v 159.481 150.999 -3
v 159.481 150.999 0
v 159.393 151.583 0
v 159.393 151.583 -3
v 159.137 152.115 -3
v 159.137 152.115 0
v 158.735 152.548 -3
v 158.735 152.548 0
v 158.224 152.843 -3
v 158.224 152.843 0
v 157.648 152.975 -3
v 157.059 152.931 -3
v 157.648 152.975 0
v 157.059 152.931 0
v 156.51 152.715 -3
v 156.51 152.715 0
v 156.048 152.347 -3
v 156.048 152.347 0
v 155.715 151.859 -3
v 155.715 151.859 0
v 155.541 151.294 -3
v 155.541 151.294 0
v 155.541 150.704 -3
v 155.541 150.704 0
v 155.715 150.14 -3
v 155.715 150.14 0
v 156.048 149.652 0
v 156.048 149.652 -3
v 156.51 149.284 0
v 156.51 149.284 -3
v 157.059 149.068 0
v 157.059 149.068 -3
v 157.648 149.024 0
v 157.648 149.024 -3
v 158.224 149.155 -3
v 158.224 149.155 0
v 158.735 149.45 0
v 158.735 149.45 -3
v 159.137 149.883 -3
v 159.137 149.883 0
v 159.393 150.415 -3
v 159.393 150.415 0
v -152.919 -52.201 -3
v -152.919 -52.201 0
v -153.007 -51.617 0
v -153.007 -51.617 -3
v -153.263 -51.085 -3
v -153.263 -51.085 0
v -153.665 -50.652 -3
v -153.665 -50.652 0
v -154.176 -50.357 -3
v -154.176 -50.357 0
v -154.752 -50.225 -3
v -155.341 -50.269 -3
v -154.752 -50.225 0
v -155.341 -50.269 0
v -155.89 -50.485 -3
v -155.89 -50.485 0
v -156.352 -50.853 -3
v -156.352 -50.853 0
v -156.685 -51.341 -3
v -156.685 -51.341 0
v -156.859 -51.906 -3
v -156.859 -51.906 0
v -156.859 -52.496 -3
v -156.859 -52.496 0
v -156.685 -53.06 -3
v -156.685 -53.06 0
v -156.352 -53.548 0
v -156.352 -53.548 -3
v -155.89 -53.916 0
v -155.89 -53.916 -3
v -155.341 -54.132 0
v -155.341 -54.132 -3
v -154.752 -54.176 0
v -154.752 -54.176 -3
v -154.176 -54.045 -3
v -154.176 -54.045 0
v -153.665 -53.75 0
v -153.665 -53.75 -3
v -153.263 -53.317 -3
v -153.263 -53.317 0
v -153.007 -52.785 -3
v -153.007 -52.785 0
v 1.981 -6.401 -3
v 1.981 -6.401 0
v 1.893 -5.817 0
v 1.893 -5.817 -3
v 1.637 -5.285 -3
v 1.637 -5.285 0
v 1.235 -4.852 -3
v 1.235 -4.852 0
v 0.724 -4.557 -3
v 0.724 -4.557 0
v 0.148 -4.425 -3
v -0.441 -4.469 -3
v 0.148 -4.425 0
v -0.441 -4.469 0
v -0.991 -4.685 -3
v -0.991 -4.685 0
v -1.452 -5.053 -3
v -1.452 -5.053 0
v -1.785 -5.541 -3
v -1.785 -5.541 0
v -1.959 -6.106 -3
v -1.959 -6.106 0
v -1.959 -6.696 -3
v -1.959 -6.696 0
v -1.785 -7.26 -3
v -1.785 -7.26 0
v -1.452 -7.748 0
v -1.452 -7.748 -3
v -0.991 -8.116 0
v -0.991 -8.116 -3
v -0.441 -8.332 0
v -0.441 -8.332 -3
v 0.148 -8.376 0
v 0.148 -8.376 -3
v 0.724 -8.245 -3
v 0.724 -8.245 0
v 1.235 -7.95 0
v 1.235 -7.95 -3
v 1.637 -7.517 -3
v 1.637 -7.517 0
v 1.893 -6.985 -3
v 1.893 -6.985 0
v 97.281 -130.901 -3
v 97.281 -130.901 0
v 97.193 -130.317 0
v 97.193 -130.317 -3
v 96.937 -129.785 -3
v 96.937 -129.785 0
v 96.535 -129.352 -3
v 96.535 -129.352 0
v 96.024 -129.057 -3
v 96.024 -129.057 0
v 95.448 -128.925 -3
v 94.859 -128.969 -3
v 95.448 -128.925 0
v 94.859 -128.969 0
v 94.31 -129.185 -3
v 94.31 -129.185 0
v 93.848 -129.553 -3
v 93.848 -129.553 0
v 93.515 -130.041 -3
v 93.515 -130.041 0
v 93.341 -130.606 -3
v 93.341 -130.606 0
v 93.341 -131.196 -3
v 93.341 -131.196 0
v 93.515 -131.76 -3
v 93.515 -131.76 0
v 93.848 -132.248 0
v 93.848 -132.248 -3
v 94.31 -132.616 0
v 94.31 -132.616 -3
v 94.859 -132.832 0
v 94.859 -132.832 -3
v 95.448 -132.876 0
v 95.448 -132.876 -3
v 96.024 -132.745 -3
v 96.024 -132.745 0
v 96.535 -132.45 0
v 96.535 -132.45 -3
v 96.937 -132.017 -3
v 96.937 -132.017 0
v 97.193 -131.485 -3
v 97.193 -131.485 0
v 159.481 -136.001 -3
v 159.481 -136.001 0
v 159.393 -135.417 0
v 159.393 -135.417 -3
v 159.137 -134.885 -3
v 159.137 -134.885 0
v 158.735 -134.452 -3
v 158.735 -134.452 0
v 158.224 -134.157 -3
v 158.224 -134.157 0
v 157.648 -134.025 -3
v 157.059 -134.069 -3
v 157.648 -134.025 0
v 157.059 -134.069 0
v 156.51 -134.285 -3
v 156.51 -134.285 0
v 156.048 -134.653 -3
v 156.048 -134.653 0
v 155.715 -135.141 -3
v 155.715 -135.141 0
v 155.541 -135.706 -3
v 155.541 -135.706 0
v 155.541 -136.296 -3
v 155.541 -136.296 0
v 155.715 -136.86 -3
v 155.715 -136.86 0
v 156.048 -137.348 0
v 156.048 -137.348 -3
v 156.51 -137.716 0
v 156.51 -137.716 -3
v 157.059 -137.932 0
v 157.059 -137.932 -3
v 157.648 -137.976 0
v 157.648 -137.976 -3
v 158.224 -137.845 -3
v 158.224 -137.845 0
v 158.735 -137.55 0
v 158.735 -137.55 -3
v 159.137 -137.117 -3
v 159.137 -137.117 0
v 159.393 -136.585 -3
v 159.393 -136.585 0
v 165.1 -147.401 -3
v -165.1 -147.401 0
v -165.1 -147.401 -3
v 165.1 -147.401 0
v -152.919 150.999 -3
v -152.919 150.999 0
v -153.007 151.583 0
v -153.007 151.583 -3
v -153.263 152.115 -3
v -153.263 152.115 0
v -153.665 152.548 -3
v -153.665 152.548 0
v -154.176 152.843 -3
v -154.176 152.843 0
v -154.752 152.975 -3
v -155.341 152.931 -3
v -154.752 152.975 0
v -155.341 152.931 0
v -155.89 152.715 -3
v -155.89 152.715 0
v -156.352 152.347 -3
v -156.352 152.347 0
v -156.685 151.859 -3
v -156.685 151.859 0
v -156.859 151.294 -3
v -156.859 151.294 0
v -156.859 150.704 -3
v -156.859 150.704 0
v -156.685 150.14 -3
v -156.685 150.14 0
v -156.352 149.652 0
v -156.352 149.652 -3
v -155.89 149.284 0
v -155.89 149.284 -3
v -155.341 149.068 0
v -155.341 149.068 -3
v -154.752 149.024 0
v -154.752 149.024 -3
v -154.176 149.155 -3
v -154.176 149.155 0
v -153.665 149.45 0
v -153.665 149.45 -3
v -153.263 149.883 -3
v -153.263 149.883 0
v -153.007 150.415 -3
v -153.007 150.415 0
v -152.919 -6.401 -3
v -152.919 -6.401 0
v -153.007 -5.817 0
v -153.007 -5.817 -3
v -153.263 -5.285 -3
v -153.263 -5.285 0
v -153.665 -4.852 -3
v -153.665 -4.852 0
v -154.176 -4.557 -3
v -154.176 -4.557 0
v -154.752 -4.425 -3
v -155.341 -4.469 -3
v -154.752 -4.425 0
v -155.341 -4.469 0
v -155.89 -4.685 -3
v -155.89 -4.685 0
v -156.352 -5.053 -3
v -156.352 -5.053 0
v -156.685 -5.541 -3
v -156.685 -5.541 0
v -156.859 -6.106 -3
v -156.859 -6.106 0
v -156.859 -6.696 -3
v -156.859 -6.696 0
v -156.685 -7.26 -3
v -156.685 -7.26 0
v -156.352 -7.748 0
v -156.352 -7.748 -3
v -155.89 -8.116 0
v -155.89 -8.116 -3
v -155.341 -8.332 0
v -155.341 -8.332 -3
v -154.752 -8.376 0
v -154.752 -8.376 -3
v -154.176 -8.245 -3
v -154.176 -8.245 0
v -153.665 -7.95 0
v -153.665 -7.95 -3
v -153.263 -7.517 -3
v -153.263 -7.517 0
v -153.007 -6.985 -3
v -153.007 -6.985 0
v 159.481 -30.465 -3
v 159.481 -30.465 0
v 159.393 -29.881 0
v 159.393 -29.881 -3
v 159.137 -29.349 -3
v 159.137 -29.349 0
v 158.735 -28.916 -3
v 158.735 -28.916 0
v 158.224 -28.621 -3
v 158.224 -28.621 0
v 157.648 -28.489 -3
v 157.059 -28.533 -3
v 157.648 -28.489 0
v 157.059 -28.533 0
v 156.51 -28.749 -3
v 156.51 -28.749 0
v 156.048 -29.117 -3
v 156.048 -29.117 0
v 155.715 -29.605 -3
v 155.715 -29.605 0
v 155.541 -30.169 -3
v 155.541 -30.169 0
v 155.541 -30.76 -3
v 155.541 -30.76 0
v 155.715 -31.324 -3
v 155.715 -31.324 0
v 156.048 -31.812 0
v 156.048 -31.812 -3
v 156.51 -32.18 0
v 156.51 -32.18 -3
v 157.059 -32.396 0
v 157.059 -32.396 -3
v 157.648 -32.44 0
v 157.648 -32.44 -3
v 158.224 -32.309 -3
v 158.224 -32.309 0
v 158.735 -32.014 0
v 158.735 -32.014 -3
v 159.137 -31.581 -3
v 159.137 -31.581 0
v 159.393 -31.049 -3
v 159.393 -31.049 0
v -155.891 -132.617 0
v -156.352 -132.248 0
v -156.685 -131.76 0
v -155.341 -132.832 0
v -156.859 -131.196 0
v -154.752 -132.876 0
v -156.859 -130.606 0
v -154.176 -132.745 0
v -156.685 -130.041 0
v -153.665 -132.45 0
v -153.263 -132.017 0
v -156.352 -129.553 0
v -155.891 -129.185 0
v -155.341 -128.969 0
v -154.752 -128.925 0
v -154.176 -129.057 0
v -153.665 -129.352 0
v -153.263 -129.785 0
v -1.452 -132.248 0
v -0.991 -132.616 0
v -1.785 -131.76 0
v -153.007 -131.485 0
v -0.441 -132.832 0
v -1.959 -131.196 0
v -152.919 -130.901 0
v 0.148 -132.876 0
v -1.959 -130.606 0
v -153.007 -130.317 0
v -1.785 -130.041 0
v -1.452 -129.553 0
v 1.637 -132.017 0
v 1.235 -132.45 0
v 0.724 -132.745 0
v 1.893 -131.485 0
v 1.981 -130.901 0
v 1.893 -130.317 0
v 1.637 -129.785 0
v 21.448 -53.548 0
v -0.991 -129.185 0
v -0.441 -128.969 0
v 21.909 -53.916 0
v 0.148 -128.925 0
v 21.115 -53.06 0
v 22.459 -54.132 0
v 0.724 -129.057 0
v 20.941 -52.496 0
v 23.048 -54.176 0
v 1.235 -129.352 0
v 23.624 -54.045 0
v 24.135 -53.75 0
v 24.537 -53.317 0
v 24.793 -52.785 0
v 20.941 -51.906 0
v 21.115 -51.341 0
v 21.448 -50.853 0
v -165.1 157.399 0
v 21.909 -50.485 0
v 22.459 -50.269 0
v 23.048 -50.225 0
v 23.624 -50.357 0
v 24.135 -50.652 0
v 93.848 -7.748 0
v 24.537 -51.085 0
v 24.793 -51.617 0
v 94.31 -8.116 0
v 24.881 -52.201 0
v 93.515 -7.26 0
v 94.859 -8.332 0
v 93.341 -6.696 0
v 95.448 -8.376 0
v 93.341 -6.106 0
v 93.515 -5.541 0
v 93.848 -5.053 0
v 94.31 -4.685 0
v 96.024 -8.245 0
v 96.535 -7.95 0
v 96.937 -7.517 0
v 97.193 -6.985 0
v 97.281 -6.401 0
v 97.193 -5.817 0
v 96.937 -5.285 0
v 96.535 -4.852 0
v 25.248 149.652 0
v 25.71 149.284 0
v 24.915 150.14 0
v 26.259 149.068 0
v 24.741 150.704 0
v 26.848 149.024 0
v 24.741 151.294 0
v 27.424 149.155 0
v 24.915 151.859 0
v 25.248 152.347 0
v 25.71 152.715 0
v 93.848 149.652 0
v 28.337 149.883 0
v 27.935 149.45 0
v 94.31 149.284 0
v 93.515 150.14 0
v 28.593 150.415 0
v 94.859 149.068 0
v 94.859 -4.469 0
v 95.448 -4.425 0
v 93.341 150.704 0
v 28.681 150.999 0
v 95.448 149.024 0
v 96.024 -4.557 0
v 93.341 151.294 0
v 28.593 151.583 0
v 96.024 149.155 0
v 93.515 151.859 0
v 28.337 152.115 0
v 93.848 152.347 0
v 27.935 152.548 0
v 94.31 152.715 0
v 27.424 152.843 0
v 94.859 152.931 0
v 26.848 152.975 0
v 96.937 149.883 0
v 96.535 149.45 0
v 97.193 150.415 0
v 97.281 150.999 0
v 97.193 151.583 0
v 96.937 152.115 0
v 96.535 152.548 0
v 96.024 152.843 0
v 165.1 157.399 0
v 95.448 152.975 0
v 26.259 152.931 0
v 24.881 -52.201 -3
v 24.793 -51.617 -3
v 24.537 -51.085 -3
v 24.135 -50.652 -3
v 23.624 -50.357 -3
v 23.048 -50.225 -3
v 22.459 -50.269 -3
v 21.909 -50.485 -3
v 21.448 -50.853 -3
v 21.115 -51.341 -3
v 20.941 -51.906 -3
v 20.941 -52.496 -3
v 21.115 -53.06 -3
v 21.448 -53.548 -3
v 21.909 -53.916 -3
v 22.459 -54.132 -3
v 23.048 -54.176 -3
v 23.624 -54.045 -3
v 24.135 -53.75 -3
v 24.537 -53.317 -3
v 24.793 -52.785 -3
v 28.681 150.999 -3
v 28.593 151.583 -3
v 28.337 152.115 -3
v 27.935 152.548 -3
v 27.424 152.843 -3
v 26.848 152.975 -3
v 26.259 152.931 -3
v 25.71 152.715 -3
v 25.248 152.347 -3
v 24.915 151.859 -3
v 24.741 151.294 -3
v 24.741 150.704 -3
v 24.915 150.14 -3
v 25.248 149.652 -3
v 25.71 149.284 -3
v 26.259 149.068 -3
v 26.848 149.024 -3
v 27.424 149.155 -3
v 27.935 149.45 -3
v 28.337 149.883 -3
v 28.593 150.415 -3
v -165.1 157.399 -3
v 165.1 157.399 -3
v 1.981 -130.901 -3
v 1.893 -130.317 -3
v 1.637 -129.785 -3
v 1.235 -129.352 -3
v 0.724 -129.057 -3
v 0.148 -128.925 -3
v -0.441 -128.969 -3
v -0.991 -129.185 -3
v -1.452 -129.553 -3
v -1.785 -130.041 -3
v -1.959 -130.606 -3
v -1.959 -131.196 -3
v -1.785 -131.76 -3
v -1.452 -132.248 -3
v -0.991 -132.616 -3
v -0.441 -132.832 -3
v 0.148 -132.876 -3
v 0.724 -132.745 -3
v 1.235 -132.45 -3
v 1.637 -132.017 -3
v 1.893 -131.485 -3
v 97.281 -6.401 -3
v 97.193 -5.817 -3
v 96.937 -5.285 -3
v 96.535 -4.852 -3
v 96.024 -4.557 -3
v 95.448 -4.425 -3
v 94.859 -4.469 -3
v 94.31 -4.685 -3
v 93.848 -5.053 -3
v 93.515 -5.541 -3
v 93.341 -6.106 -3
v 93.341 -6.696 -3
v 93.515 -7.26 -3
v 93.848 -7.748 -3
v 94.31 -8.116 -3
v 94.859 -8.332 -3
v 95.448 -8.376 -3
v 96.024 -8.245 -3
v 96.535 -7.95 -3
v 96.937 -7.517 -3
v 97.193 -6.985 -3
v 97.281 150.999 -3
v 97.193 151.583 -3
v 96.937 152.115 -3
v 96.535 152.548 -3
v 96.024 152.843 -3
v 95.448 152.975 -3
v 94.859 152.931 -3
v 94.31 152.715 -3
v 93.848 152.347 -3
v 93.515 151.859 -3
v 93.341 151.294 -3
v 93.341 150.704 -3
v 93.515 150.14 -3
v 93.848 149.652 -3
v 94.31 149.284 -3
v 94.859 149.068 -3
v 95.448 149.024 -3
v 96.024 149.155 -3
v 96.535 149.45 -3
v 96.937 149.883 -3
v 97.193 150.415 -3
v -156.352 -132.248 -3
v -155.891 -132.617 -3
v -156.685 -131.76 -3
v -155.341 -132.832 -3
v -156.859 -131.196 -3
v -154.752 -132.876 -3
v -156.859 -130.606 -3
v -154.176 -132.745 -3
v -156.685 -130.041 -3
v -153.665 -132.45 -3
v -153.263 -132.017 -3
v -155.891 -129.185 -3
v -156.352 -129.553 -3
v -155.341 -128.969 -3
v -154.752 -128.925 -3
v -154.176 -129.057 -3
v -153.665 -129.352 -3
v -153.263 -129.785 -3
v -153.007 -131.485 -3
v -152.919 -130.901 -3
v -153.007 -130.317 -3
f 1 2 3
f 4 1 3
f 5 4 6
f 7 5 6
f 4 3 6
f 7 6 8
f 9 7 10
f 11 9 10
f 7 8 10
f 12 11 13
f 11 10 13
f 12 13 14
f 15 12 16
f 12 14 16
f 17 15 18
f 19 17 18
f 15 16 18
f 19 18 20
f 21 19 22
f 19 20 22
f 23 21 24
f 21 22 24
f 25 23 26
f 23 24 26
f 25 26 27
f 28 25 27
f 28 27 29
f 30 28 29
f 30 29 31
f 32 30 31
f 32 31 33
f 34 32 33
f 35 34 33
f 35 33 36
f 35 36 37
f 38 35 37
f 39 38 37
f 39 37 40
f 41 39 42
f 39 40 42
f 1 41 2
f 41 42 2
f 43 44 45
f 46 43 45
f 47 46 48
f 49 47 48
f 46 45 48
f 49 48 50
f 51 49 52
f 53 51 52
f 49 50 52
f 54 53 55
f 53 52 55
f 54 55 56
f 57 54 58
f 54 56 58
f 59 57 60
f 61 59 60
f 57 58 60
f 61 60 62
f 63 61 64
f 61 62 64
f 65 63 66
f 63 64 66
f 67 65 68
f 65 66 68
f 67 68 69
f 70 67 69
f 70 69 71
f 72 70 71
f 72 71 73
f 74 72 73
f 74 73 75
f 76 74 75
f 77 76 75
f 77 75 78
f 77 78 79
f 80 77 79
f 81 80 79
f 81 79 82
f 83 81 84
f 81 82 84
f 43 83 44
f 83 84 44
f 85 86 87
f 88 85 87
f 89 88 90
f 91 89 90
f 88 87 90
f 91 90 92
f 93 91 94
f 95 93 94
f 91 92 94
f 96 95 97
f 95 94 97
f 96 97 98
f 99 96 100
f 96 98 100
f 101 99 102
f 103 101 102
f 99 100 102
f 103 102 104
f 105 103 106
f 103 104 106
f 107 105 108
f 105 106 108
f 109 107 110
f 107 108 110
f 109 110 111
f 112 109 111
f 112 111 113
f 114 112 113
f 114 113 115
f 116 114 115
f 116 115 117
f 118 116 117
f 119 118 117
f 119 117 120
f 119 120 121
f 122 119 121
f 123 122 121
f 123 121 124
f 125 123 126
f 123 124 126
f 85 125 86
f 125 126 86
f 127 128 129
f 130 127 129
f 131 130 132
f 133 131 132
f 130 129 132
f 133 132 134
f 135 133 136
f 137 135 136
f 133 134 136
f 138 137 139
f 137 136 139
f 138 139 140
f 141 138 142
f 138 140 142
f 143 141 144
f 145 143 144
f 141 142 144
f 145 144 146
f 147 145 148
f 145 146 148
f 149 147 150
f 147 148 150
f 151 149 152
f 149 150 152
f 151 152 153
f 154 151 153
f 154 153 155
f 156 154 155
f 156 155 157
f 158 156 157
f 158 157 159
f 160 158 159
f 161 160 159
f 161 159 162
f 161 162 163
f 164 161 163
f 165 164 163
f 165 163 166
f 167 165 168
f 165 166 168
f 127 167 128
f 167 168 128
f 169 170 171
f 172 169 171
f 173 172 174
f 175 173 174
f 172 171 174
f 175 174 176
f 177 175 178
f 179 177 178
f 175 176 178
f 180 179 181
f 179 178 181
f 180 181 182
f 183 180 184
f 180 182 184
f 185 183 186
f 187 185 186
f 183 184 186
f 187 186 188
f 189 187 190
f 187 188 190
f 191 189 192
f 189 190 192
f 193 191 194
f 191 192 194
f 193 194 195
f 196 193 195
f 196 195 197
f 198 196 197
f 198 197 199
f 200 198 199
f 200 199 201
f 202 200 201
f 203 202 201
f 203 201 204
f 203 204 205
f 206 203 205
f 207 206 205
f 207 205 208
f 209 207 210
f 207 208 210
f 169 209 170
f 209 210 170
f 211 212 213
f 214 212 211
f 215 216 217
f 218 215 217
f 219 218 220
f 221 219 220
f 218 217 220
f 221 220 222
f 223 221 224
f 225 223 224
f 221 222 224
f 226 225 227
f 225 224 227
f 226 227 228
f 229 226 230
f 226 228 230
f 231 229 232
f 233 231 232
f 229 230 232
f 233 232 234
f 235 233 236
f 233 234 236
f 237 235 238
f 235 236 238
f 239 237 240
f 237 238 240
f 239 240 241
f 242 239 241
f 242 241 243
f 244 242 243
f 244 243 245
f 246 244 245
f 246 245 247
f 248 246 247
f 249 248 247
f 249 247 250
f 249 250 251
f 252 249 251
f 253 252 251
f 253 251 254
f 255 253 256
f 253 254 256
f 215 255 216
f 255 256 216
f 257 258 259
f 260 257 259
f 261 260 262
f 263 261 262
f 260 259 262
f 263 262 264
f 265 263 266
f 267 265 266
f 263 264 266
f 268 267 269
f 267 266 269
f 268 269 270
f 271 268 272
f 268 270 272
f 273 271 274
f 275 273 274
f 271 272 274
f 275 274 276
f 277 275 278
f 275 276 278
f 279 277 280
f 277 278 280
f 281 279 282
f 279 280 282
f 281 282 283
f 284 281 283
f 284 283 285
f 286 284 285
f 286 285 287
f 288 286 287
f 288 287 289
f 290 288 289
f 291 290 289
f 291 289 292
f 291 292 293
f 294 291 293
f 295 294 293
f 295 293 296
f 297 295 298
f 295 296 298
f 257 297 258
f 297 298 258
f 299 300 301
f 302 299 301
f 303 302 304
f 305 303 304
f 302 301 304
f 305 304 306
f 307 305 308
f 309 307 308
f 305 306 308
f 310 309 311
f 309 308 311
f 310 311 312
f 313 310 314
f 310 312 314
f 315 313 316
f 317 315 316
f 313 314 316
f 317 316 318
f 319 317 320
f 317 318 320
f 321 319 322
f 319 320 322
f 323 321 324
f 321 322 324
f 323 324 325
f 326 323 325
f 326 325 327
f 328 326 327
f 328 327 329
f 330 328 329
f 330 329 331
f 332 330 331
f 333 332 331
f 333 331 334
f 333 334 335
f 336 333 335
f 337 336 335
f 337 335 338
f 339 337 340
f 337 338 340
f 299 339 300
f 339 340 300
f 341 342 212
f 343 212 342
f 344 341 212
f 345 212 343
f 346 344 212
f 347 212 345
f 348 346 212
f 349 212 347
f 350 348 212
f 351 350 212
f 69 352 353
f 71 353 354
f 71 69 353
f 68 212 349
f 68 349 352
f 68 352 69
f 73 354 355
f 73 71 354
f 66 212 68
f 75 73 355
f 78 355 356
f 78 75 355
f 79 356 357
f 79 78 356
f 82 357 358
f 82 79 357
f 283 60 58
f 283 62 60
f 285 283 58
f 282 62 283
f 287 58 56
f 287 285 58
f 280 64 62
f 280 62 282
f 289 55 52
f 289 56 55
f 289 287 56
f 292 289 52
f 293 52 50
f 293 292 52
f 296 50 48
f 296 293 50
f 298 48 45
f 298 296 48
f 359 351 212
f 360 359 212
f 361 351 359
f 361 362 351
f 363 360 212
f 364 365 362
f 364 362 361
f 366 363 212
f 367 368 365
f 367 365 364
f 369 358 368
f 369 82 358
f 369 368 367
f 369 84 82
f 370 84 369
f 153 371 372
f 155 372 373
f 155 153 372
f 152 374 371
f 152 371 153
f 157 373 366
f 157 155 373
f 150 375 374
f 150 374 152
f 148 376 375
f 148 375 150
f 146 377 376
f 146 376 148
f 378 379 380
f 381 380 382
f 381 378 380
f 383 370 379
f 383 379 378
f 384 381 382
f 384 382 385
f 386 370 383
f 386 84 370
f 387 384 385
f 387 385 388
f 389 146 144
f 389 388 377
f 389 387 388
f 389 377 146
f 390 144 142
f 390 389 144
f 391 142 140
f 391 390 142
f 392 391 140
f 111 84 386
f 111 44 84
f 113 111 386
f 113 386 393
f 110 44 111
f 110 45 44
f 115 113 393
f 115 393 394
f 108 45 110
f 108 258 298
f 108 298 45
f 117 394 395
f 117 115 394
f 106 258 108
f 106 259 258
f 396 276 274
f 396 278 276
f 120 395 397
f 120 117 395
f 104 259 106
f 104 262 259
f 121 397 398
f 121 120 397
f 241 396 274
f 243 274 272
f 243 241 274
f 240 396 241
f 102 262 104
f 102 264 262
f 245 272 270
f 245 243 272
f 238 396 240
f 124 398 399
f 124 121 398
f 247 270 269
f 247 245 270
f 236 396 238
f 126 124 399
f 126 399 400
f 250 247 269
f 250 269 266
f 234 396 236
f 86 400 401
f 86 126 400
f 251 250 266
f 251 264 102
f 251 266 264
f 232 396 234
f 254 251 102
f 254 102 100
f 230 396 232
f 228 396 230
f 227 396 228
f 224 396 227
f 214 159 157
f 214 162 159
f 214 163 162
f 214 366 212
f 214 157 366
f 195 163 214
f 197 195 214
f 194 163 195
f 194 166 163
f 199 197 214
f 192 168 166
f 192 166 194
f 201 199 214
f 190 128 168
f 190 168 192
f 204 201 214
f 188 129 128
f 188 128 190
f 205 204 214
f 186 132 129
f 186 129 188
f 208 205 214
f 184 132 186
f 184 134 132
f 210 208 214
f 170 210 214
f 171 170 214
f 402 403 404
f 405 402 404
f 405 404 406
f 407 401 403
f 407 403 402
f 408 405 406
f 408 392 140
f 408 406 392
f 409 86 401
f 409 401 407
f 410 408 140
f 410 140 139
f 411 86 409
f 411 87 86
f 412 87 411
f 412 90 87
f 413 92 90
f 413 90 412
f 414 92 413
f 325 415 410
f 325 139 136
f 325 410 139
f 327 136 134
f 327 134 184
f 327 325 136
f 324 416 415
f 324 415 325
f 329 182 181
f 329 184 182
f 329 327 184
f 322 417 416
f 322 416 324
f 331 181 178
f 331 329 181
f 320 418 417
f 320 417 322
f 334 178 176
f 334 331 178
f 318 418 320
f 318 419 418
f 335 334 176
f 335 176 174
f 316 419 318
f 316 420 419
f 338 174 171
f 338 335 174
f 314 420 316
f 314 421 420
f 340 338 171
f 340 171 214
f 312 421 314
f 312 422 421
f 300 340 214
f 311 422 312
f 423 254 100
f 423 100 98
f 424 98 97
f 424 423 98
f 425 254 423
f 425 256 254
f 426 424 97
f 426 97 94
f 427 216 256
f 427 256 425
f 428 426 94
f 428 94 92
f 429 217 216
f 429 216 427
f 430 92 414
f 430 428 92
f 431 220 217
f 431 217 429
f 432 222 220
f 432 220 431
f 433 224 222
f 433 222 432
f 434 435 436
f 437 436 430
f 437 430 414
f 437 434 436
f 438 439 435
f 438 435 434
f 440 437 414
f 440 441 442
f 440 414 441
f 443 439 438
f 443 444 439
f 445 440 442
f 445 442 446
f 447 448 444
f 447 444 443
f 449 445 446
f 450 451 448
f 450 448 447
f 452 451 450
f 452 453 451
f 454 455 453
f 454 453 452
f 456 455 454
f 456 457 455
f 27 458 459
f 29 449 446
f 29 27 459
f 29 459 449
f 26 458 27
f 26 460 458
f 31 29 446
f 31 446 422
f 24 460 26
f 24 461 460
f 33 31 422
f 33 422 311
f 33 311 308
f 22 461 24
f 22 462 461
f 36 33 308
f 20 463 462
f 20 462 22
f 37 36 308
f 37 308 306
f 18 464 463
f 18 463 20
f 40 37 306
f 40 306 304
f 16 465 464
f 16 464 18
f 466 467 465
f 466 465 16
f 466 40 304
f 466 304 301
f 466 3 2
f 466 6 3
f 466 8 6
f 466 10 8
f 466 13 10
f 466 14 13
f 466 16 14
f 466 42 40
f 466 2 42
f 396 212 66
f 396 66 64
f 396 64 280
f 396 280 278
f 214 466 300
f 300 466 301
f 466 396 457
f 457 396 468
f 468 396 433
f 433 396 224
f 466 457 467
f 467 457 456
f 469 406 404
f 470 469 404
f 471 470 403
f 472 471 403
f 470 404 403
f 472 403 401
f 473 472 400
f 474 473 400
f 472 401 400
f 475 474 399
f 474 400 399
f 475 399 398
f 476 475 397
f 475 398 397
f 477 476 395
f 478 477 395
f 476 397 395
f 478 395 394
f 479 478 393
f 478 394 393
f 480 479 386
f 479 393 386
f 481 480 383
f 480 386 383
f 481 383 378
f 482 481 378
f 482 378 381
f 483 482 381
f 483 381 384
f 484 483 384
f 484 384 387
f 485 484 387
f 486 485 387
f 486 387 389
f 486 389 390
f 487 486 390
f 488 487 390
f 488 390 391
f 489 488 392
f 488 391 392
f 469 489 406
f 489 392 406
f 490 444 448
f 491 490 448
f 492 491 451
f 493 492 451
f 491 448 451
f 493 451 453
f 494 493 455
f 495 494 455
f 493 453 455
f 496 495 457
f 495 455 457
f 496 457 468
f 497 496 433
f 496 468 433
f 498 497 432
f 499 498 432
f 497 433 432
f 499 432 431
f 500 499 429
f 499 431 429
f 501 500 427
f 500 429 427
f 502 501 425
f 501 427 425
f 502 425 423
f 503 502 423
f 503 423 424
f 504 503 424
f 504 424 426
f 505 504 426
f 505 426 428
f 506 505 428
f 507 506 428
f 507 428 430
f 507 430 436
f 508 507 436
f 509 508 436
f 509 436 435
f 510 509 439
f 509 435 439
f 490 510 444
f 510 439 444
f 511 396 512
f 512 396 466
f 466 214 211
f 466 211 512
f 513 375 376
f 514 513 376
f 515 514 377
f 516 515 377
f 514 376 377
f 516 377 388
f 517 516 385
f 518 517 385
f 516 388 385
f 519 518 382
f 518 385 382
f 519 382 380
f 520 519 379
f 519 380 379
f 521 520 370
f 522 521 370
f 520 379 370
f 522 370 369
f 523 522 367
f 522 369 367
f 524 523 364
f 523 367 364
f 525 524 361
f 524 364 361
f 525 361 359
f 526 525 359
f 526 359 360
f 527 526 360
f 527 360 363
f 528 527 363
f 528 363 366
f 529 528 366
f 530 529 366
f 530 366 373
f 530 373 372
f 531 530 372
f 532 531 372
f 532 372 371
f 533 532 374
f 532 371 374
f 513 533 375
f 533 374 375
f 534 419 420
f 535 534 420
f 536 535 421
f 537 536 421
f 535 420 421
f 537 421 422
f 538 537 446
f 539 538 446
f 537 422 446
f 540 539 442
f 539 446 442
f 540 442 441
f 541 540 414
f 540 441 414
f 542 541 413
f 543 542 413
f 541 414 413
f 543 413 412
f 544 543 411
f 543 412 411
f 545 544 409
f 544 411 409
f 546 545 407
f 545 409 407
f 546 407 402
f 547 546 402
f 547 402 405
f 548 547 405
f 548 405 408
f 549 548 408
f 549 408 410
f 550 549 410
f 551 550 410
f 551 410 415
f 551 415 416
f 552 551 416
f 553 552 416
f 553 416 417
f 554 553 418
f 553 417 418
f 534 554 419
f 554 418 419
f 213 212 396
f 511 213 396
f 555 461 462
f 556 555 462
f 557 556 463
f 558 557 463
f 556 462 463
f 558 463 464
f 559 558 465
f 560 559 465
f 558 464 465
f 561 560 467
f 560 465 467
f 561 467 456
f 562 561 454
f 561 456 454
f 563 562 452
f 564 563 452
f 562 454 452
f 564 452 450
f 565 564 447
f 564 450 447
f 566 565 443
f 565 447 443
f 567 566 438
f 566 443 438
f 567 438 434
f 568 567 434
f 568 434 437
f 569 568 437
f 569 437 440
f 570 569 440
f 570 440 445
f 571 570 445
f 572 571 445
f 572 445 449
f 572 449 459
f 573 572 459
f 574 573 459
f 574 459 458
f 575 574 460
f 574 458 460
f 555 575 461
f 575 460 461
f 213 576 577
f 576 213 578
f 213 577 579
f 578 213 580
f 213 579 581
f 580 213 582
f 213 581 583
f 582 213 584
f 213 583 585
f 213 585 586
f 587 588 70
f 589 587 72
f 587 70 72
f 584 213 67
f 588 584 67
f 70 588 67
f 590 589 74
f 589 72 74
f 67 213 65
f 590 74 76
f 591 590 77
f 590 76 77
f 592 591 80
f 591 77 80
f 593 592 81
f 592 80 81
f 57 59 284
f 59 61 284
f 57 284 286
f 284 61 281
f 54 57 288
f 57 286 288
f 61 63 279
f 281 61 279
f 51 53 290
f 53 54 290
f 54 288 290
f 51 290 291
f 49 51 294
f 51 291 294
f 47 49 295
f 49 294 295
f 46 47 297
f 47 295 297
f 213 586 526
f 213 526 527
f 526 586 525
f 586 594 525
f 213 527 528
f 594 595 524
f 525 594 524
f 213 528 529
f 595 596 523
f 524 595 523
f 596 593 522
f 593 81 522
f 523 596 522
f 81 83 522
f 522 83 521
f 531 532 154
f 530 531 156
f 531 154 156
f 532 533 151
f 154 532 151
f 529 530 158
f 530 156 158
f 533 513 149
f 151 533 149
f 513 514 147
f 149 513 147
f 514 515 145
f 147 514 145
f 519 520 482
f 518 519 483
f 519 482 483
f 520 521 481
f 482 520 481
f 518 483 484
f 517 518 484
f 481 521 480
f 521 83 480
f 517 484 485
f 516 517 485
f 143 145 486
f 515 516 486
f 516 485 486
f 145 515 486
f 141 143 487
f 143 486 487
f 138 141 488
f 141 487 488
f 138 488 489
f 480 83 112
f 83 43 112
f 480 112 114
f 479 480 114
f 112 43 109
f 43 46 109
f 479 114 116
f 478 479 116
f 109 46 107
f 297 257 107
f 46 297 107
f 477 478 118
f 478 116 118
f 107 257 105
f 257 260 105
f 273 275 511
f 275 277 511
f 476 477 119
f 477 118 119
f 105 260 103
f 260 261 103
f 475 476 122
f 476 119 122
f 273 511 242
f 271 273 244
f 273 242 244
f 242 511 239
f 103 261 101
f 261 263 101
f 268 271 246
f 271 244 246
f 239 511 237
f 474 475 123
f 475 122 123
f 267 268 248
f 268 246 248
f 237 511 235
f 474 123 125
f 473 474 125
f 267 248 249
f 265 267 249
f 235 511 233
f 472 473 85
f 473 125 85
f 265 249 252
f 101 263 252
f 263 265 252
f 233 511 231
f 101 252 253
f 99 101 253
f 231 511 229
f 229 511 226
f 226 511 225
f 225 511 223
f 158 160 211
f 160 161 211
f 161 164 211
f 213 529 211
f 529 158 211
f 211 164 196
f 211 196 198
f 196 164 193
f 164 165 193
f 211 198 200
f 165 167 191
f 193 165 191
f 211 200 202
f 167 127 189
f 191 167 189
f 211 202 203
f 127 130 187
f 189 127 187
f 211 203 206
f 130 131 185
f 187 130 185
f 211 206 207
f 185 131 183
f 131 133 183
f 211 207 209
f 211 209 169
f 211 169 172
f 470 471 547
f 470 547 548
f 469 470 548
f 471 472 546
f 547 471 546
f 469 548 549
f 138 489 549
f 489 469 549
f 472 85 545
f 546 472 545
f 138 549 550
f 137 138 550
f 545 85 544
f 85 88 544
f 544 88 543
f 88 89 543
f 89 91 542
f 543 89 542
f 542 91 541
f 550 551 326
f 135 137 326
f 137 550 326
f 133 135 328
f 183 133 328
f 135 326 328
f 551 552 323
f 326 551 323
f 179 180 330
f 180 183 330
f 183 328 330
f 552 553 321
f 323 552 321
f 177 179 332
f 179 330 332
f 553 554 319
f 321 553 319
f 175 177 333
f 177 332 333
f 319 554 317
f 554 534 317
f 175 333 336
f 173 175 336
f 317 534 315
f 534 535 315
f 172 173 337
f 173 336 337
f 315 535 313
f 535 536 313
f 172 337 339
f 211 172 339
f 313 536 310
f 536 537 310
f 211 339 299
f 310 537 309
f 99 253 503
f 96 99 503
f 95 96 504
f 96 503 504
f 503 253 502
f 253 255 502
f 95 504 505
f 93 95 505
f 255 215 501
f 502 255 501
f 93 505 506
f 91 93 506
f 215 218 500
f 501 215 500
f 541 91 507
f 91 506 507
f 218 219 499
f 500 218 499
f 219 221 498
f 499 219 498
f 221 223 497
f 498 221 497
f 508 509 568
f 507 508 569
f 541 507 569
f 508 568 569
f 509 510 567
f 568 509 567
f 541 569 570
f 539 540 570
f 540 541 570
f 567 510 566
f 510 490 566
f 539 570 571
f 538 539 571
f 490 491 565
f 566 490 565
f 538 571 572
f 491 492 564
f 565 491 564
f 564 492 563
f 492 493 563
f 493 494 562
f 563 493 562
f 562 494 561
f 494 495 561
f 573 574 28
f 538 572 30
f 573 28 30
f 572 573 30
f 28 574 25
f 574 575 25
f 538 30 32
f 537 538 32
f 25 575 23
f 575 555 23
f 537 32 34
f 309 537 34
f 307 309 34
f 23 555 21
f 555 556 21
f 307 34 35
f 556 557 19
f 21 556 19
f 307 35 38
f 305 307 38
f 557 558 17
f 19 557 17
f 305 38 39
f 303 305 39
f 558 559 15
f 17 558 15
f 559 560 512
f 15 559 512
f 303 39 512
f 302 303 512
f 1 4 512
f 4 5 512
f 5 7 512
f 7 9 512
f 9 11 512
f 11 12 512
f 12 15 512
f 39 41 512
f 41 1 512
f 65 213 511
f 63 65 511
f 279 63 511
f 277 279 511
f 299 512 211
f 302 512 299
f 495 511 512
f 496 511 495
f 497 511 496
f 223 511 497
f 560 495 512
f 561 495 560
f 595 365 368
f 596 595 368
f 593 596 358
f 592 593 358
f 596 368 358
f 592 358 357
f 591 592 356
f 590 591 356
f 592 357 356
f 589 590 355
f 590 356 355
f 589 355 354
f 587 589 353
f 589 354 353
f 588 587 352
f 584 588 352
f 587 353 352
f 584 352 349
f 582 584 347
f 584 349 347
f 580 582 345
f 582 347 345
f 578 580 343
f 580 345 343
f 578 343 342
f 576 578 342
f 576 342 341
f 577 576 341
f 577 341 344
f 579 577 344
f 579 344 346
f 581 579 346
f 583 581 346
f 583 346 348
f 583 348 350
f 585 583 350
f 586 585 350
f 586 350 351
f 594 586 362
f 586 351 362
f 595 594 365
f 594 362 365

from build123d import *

# Parameters (mm, degrees)
F0_W     = 330.2
F0_H     = 304.8
F0_R     = 1.9812
F0_R_2   = 1.981
F1_DEPTH = 3


with BuildPart() as f1:
    # F0 (on Top) → F1 (new body)
    with BuildSketch(Plane.XY):
        with Locations((0, 4.9992)):
            Rectangle(F0_W, F0_H)
        with Locations((-154.9, -130.9008)):
            Circle(F0_R, mode=Mode.SUBTRACT)
        with Locations((-154.9, -52.2008)):
            Circle(F0_R_2, mode=Mode.SUBTRACT)
        with Locations((-154.9, -6.4008)):
            Circle(F0_R_2, mode=Mode.SUBTRACT)
        with Locations((0, -130.9008)):
            Circle(F0_R_2, mode=Mode.SUBTRACT)
        with Locations((95.3, -130.9008)):
            Circle(F0_R_2, mode=Mode.SUBTRACT)
        with Locations((157.5, -136.0008)):
            Circle(F0_R_2, mode=Mode.SUBTRACT)
        with Locations((22.9, -52.2008)):
            Circle(F0_R_2, mode=Mode.SUBTRACT)
        with Locations((0, -6.4008)):
            Circle(F0_R_2, mode=Mode.SUBTRACT)
        with Locations((95.3, -6.4008)):
            Circle(F0_R_2, mode=Mode.SUBTRACT)
        with Locations((157.5, -30.464708)):
            Circle(F0_R_2, mode=Mode.SUBTRACT)
        with Locations((-154.9, 150.9992)):
            Circle(F0_R_2, mode=Mode.SUBTRACT)
        with Locations((26.7, 150.9992)):
            Circle(F0_R_2, mode=Mode.SUBTRACT)
        with Locations((95.3, 150.9992)):
            Circle(F0_R_2, mode=Mode.SUBTRACT)
        with Locations((157.5, 150.9992)):
            Circle(F0_R_2, mode=Mode.SUBTRACT)
    extrude(amount=-F1_DEPTH)


solid = f1.part
